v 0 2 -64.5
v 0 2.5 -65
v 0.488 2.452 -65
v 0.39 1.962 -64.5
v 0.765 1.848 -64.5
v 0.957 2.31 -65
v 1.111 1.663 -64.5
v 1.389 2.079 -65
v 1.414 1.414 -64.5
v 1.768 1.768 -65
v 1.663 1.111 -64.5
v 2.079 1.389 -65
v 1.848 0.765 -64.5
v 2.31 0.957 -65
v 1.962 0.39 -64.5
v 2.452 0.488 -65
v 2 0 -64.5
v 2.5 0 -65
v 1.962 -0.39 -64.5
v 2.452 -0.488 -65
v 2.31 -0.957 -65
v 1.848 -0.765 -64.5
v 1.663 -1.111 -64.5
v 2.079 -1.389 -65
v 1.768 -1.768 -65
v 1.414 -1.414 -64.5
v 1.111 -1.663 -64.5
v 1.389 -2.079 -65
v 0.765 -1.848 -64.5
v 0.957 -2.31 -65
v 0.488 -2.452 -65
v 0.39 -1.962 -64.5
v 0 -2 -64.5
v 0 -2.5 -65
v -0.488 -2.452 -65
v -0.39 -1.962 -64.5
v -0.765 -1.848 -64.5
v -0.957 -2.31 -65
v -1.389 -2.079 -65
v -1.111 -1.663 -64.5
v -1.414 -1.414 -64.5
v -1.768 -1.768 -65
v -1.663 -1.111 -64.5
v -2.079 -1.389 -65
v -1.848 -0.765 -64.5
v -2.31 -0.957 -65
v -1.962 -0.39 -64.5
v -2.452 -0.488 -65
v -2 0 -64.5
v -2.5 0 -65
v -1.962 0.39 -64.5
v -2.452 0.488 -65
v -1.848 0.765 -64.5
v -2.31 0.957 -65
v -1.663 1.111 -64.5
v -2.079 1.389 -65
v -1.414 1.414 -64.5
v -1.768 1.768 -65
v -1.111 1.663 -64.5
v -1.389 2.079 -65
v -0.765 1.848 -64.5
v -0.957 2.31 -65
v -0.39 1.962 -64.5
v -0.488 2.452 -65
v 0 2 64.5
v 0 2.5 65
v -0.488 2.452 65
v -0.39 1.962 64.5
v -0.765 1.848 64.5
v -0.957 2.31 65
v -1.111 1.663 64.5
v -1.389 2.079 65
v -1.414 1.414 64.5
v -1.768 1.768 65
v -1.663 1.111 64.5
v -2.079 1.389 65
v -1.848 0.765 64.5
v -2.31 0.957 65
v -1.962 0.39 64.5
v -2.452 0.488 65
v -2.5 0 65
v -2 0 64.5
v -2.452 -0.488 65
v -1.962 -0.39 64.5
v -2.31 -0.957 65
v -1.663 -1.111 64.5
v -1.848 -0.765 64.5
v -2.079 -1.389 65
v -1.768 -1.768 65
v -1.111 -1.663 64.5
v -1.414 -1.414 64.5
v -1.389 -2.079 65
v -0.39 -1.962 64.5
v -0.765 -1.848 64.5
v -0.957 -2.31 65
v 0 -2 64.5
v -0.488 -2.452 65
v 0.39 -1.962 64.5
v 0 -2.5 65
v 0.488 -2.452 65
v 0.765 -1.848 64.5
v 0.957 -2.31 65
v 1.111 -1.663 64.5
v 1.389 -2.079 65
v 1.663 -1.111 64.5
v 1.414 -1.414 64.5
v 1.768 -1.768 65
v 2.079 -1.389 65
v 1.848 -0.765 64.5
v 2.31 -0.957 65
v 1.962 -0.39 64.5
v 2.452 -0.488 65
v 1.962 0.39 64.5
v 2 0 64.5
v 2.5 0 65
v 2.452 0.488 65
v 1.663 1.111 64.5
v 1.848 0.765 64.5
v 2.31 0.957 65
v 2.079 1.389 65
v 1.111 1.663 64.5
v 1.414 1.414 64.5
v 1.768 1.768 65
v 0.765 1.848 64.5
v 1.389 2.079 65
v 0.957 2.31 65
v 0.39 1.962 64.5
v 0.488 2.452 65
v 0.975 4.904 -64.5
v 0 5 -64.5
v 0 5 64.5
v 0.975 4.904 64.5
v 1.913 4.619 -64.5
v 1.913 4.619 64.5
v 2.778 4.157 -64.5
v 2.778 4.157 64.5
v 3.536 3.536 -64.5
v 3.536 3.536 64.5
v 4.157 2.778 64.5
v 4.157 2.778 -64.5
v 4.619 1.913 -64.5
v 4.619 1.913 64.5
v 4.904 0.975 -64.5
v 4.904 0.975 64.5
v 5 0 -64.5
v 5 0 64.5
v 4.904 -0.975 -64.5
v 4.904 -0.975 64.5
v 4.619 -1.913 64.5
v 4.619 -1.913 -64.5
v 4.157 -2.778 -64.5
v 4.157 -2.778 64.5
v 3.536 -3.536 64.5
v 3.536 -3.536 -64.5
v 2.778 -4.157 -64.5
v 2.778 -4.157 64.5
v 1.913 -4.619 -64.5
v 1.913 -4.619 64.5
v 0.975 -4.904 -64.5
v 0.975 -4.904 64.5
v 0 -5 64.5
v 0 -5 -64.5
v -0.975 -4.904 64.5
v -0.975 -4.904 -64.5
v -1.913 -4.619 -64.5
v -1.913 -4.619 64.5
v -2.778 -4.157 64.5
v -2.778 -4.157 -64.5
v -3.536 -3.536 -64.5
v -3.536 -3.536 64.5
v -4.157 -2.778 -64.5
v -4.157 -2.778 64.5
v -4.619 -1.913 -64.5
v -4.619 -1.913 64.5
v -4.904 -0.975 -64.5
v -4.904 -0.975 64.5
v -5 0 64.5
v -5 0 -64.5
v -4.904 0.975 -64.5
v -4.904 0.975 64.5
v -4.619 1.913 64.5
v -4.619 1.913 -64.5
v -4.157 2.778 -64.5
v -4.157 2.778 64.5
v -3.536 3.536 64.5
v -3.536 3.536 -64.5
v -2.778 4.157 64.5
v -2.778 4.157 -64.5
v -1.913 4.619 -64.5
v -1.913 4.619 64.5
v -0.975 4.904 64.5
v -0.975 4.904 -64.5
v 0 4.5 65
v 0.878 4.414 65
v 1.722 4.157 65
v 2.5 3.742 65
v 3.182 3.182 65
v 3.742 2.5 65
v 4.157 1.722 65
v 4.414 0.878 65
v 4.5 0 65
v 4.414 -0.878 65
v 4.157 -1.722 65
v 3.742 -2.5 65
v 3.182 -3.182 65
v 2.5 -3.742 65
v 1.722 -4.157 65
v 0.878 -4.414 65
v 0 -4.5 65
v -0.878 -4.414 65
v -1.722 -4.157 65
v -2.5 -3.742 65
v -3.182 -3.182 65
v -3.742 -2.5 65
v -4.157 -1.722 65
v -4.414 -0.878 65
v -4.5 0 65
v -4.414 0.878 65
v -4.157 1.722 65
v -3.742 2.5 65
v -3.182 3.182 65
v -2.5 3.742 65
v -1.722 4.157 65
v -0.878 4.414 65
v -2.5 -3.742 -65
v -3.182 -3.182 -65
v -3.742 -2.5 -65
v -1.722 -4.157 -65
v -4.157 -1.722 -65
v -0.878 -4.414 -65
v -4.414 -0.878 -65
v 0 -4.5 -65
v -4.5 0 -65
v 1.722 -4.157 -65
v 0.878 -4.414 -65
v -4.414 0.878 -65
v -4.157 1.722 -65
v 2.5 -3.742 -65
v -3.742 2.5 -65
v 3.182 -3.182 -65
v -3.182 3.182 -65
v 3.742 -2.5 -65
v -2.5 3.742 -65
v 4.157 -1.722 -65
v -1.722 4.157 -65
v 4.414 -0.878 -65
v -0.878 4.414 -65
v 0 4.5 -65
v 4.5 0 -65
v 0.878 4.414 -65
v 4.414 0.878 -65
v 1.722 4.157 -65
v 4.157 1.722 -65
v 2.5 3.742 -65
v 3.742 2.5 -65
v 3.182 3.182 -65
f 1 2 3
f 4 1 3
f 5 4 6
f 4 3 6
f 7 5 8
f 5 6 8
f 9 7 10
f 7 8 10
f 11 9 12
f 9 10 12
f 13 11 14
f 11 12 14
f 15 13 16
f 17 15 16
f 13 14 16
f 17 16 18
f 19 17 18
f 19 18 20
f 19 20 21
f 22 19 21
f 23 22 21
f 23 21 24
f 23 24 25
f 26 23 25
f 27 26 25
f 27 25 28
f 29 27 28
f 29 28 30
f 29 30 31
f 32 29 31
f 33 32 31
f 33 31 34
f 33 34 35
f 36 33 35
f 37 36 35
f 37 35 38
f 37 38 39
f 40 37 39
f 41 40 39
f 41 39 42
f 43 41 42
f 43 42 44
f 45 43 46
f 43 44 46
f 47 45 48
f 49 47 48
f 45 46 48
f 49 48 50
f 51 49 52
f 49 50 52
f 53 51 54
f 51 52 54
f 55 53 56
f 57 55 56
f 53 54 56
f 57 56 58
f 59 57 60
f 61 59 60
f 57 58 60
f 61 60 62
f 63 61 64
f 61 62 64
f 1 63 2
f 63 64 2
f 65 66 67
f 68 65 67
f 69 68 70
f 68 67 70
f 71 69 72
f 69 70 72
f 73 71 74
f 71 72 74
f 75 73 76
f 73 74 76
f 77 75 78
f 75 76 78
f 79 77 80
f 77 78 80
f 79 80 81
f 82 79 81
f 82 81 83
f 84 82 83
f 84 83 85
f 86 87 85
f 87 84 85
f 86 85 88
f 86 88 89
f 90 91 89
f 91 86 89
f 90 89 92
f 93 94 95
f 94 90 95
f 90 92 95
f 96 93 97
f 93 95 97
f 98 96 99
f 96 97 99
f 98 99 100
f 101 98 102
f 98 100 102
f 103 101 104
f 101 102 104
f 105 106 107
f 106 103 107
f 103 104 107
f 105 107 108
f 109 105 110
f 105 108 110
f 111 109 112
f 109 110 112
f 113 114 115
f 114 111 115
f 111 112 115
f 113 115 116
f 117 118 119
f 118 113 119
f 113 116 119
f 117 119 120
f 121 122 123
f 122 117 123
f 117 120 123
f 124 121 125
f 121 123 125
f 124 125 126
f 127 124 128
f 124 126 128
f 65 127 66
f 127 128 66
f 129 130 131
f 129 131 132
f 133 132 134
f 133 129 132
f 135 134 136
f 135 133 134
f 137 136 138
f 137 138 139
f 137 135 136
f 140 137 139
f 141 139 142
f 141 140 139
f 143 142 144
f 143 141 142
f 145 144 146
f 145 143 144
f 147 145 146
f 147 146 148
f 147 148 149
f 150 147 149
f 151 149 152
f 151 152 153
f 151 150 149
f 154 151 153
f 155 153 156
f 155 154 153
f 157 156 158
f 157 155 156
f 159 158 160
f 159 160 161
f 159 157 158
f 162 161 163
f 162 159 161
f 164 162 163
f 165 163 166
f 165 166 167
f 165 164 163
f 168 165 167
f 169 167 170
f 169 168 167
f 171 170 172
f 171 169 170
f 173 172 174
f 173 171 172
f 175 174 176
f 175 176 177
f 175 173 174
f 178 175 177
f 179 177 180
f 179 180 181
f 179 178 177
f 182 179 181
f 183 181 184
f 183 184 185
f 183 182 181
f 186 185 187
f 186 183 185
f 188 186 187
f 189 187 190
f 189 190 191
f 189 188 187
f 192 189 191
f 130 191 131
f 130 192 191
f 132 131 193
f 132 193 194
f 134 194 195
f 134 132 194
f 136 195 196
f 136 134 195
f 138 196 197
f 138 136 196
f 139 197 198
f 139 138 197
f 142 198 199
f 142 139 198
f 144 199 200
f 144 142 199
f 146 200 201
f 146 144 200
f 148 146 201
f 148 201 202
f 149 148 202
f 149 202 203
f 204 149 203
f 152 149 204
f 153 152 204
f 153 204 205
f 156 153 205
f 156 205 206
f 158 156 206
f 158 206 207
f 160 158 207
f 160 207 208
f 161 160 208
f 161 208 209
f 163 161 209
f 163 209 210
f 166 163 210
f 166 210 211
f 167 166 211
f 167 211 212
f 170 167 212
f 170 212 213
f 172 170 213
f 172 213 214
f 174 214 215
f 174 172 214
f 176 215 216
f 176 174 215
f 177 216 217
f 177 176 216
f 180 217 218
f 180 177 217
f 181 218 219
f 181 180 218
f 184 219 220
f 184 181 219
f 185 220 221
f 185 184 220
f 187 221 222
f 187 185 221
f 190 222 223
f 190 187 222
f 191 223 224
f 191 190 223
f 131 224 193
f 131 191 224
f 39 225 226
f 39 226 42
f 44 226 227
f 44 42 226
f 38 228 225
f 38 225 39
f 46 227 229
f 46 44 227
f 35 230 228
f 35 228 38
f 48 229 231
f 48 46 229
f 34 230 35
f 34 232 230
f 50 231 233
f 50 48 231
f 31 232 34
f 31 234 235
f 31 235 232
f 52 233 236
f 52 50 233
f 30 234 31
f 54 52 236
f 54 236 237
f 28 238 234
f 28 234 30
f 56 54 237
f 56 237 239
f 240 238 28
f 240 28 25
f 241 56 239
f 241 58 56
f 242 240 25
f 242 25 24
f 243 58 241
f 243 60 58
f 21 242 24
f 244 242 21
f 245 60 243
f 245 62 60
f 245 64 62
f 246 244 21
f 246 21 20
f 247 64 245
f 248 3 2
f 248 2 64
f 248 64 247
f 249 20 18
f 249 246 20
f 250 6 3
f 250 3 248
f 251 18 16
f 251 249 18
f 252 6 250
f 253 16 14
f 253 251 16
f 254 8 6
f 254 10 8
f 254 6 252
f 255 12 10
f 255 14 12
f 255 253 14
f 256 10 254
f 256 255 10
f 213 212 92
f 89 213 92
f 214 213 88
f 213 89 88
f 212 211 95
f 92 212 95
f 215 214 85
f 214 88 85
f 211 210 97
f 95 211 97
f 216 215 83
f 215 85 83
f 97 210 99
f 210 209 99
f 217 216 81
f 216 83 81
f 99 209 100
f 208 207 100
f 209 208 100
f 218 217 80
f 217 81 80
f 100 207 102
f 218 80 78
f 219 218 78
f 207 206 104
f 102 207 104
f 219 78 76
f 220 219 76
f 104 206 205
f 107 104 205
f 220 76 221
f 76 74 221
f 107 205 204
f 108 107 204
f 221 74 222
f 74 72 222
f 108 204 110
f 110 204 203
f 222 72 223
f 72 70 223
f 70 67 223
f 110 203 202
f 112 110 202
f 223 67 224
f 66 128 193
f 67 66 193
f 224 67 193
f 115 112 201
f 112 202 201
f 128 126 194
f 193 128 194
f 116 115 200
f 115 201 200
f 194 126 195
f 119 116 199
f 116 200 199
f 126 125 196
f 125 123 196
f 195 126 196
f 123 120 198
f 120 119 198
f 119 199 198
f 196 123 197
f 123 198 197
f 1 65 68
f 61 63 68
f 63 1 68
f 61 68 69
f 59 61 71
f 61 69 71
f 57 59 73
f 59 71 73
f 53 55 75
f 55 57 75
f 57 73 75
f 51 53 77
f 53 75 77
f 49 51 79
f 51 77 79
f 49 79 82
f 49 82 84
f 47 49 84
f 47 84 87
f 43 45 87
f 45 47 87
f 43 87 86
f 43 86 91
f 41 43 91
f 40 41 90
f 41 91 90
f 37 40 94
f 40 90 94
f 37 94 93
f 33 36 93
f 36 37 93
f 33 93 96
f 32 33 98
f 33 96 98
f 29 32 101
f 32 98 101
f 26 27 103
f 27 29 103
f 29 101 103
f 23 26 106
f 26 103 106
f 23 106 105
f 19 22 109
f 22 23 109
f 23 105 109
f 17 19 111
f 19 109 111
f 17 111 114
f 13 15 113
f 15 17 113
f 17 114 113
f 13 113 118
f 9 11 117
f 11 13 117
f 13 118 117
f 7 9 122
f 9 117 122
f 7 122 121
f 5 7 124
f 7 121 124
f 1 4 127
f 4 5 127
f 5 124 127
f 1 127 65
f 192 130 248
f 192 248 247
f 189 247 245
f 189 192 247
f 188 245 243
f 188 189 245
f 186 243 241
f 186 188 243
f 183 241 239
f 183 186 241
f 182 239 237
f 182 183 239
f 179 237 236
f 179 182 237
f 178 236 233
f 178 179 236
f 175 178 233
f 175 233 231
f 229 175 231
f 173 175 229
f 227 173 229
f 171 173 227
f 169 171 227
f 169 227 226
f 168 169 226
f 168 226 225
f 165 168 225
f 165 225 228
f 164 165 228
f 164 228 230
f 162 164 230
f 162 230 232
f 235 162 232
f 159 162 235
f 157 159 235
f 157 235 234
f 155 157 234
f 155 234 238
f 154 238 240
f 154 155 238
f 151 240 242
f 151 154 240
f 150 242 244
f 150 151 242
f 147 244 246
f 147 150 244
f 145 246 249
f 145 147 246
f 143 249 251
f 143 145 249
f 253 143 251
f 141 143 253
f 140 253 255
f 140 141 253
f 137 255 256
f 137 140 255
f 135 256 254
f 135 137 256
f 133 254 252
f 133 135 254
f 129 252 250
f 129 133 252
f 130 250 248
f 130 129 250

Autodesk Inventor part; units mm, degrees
ref_plane "YZ Plane" through (0, 0, 0) normal (1, 0, 0) x (0, 1, 0)
ref_plane "XZ Plane" through (0, 0, 0) normal (0, 1, 0) x (-1, 0, 0)
ref_plane "XY Plane" through (0, 0, 0) normal (0, 0, 1) x (1, 0, 0)
sketch "Boceto1" plane through (0, 0, 0) normal (1, 0, 0) x (0, 1, 0)
  line L0 (0, 65) -> (0, -65) construction
  line L1 (2, 65) -> (5, 65)
  line L2 (5, 65) -> (5, -65)
  line L3 (5, -65) -> (2, -65)
  line L4 (2, -65) -> (2, 65)
  point P0 (0, 0)
  point P1 (0, 0)
  dimension "d0" = 130
  dimension "d1" = 10
  dimension "d2" = 3
revolve "Revolución1" add sketch "Boceto1" angle 360 about axis through (0, 0, 65) along (0, 0, -1)
thread "Rosca1" size "M10x1.5" class "6g" standard "ANSI Metric M Profile" full length
chamfer "Chaflán1" distance 0.5 angle 45 4 edges at (0, -2, 65) (0, -5, 65) (0, -2, -65) (0, -5, -65)
properties part number "eje_manzana_delantera"
